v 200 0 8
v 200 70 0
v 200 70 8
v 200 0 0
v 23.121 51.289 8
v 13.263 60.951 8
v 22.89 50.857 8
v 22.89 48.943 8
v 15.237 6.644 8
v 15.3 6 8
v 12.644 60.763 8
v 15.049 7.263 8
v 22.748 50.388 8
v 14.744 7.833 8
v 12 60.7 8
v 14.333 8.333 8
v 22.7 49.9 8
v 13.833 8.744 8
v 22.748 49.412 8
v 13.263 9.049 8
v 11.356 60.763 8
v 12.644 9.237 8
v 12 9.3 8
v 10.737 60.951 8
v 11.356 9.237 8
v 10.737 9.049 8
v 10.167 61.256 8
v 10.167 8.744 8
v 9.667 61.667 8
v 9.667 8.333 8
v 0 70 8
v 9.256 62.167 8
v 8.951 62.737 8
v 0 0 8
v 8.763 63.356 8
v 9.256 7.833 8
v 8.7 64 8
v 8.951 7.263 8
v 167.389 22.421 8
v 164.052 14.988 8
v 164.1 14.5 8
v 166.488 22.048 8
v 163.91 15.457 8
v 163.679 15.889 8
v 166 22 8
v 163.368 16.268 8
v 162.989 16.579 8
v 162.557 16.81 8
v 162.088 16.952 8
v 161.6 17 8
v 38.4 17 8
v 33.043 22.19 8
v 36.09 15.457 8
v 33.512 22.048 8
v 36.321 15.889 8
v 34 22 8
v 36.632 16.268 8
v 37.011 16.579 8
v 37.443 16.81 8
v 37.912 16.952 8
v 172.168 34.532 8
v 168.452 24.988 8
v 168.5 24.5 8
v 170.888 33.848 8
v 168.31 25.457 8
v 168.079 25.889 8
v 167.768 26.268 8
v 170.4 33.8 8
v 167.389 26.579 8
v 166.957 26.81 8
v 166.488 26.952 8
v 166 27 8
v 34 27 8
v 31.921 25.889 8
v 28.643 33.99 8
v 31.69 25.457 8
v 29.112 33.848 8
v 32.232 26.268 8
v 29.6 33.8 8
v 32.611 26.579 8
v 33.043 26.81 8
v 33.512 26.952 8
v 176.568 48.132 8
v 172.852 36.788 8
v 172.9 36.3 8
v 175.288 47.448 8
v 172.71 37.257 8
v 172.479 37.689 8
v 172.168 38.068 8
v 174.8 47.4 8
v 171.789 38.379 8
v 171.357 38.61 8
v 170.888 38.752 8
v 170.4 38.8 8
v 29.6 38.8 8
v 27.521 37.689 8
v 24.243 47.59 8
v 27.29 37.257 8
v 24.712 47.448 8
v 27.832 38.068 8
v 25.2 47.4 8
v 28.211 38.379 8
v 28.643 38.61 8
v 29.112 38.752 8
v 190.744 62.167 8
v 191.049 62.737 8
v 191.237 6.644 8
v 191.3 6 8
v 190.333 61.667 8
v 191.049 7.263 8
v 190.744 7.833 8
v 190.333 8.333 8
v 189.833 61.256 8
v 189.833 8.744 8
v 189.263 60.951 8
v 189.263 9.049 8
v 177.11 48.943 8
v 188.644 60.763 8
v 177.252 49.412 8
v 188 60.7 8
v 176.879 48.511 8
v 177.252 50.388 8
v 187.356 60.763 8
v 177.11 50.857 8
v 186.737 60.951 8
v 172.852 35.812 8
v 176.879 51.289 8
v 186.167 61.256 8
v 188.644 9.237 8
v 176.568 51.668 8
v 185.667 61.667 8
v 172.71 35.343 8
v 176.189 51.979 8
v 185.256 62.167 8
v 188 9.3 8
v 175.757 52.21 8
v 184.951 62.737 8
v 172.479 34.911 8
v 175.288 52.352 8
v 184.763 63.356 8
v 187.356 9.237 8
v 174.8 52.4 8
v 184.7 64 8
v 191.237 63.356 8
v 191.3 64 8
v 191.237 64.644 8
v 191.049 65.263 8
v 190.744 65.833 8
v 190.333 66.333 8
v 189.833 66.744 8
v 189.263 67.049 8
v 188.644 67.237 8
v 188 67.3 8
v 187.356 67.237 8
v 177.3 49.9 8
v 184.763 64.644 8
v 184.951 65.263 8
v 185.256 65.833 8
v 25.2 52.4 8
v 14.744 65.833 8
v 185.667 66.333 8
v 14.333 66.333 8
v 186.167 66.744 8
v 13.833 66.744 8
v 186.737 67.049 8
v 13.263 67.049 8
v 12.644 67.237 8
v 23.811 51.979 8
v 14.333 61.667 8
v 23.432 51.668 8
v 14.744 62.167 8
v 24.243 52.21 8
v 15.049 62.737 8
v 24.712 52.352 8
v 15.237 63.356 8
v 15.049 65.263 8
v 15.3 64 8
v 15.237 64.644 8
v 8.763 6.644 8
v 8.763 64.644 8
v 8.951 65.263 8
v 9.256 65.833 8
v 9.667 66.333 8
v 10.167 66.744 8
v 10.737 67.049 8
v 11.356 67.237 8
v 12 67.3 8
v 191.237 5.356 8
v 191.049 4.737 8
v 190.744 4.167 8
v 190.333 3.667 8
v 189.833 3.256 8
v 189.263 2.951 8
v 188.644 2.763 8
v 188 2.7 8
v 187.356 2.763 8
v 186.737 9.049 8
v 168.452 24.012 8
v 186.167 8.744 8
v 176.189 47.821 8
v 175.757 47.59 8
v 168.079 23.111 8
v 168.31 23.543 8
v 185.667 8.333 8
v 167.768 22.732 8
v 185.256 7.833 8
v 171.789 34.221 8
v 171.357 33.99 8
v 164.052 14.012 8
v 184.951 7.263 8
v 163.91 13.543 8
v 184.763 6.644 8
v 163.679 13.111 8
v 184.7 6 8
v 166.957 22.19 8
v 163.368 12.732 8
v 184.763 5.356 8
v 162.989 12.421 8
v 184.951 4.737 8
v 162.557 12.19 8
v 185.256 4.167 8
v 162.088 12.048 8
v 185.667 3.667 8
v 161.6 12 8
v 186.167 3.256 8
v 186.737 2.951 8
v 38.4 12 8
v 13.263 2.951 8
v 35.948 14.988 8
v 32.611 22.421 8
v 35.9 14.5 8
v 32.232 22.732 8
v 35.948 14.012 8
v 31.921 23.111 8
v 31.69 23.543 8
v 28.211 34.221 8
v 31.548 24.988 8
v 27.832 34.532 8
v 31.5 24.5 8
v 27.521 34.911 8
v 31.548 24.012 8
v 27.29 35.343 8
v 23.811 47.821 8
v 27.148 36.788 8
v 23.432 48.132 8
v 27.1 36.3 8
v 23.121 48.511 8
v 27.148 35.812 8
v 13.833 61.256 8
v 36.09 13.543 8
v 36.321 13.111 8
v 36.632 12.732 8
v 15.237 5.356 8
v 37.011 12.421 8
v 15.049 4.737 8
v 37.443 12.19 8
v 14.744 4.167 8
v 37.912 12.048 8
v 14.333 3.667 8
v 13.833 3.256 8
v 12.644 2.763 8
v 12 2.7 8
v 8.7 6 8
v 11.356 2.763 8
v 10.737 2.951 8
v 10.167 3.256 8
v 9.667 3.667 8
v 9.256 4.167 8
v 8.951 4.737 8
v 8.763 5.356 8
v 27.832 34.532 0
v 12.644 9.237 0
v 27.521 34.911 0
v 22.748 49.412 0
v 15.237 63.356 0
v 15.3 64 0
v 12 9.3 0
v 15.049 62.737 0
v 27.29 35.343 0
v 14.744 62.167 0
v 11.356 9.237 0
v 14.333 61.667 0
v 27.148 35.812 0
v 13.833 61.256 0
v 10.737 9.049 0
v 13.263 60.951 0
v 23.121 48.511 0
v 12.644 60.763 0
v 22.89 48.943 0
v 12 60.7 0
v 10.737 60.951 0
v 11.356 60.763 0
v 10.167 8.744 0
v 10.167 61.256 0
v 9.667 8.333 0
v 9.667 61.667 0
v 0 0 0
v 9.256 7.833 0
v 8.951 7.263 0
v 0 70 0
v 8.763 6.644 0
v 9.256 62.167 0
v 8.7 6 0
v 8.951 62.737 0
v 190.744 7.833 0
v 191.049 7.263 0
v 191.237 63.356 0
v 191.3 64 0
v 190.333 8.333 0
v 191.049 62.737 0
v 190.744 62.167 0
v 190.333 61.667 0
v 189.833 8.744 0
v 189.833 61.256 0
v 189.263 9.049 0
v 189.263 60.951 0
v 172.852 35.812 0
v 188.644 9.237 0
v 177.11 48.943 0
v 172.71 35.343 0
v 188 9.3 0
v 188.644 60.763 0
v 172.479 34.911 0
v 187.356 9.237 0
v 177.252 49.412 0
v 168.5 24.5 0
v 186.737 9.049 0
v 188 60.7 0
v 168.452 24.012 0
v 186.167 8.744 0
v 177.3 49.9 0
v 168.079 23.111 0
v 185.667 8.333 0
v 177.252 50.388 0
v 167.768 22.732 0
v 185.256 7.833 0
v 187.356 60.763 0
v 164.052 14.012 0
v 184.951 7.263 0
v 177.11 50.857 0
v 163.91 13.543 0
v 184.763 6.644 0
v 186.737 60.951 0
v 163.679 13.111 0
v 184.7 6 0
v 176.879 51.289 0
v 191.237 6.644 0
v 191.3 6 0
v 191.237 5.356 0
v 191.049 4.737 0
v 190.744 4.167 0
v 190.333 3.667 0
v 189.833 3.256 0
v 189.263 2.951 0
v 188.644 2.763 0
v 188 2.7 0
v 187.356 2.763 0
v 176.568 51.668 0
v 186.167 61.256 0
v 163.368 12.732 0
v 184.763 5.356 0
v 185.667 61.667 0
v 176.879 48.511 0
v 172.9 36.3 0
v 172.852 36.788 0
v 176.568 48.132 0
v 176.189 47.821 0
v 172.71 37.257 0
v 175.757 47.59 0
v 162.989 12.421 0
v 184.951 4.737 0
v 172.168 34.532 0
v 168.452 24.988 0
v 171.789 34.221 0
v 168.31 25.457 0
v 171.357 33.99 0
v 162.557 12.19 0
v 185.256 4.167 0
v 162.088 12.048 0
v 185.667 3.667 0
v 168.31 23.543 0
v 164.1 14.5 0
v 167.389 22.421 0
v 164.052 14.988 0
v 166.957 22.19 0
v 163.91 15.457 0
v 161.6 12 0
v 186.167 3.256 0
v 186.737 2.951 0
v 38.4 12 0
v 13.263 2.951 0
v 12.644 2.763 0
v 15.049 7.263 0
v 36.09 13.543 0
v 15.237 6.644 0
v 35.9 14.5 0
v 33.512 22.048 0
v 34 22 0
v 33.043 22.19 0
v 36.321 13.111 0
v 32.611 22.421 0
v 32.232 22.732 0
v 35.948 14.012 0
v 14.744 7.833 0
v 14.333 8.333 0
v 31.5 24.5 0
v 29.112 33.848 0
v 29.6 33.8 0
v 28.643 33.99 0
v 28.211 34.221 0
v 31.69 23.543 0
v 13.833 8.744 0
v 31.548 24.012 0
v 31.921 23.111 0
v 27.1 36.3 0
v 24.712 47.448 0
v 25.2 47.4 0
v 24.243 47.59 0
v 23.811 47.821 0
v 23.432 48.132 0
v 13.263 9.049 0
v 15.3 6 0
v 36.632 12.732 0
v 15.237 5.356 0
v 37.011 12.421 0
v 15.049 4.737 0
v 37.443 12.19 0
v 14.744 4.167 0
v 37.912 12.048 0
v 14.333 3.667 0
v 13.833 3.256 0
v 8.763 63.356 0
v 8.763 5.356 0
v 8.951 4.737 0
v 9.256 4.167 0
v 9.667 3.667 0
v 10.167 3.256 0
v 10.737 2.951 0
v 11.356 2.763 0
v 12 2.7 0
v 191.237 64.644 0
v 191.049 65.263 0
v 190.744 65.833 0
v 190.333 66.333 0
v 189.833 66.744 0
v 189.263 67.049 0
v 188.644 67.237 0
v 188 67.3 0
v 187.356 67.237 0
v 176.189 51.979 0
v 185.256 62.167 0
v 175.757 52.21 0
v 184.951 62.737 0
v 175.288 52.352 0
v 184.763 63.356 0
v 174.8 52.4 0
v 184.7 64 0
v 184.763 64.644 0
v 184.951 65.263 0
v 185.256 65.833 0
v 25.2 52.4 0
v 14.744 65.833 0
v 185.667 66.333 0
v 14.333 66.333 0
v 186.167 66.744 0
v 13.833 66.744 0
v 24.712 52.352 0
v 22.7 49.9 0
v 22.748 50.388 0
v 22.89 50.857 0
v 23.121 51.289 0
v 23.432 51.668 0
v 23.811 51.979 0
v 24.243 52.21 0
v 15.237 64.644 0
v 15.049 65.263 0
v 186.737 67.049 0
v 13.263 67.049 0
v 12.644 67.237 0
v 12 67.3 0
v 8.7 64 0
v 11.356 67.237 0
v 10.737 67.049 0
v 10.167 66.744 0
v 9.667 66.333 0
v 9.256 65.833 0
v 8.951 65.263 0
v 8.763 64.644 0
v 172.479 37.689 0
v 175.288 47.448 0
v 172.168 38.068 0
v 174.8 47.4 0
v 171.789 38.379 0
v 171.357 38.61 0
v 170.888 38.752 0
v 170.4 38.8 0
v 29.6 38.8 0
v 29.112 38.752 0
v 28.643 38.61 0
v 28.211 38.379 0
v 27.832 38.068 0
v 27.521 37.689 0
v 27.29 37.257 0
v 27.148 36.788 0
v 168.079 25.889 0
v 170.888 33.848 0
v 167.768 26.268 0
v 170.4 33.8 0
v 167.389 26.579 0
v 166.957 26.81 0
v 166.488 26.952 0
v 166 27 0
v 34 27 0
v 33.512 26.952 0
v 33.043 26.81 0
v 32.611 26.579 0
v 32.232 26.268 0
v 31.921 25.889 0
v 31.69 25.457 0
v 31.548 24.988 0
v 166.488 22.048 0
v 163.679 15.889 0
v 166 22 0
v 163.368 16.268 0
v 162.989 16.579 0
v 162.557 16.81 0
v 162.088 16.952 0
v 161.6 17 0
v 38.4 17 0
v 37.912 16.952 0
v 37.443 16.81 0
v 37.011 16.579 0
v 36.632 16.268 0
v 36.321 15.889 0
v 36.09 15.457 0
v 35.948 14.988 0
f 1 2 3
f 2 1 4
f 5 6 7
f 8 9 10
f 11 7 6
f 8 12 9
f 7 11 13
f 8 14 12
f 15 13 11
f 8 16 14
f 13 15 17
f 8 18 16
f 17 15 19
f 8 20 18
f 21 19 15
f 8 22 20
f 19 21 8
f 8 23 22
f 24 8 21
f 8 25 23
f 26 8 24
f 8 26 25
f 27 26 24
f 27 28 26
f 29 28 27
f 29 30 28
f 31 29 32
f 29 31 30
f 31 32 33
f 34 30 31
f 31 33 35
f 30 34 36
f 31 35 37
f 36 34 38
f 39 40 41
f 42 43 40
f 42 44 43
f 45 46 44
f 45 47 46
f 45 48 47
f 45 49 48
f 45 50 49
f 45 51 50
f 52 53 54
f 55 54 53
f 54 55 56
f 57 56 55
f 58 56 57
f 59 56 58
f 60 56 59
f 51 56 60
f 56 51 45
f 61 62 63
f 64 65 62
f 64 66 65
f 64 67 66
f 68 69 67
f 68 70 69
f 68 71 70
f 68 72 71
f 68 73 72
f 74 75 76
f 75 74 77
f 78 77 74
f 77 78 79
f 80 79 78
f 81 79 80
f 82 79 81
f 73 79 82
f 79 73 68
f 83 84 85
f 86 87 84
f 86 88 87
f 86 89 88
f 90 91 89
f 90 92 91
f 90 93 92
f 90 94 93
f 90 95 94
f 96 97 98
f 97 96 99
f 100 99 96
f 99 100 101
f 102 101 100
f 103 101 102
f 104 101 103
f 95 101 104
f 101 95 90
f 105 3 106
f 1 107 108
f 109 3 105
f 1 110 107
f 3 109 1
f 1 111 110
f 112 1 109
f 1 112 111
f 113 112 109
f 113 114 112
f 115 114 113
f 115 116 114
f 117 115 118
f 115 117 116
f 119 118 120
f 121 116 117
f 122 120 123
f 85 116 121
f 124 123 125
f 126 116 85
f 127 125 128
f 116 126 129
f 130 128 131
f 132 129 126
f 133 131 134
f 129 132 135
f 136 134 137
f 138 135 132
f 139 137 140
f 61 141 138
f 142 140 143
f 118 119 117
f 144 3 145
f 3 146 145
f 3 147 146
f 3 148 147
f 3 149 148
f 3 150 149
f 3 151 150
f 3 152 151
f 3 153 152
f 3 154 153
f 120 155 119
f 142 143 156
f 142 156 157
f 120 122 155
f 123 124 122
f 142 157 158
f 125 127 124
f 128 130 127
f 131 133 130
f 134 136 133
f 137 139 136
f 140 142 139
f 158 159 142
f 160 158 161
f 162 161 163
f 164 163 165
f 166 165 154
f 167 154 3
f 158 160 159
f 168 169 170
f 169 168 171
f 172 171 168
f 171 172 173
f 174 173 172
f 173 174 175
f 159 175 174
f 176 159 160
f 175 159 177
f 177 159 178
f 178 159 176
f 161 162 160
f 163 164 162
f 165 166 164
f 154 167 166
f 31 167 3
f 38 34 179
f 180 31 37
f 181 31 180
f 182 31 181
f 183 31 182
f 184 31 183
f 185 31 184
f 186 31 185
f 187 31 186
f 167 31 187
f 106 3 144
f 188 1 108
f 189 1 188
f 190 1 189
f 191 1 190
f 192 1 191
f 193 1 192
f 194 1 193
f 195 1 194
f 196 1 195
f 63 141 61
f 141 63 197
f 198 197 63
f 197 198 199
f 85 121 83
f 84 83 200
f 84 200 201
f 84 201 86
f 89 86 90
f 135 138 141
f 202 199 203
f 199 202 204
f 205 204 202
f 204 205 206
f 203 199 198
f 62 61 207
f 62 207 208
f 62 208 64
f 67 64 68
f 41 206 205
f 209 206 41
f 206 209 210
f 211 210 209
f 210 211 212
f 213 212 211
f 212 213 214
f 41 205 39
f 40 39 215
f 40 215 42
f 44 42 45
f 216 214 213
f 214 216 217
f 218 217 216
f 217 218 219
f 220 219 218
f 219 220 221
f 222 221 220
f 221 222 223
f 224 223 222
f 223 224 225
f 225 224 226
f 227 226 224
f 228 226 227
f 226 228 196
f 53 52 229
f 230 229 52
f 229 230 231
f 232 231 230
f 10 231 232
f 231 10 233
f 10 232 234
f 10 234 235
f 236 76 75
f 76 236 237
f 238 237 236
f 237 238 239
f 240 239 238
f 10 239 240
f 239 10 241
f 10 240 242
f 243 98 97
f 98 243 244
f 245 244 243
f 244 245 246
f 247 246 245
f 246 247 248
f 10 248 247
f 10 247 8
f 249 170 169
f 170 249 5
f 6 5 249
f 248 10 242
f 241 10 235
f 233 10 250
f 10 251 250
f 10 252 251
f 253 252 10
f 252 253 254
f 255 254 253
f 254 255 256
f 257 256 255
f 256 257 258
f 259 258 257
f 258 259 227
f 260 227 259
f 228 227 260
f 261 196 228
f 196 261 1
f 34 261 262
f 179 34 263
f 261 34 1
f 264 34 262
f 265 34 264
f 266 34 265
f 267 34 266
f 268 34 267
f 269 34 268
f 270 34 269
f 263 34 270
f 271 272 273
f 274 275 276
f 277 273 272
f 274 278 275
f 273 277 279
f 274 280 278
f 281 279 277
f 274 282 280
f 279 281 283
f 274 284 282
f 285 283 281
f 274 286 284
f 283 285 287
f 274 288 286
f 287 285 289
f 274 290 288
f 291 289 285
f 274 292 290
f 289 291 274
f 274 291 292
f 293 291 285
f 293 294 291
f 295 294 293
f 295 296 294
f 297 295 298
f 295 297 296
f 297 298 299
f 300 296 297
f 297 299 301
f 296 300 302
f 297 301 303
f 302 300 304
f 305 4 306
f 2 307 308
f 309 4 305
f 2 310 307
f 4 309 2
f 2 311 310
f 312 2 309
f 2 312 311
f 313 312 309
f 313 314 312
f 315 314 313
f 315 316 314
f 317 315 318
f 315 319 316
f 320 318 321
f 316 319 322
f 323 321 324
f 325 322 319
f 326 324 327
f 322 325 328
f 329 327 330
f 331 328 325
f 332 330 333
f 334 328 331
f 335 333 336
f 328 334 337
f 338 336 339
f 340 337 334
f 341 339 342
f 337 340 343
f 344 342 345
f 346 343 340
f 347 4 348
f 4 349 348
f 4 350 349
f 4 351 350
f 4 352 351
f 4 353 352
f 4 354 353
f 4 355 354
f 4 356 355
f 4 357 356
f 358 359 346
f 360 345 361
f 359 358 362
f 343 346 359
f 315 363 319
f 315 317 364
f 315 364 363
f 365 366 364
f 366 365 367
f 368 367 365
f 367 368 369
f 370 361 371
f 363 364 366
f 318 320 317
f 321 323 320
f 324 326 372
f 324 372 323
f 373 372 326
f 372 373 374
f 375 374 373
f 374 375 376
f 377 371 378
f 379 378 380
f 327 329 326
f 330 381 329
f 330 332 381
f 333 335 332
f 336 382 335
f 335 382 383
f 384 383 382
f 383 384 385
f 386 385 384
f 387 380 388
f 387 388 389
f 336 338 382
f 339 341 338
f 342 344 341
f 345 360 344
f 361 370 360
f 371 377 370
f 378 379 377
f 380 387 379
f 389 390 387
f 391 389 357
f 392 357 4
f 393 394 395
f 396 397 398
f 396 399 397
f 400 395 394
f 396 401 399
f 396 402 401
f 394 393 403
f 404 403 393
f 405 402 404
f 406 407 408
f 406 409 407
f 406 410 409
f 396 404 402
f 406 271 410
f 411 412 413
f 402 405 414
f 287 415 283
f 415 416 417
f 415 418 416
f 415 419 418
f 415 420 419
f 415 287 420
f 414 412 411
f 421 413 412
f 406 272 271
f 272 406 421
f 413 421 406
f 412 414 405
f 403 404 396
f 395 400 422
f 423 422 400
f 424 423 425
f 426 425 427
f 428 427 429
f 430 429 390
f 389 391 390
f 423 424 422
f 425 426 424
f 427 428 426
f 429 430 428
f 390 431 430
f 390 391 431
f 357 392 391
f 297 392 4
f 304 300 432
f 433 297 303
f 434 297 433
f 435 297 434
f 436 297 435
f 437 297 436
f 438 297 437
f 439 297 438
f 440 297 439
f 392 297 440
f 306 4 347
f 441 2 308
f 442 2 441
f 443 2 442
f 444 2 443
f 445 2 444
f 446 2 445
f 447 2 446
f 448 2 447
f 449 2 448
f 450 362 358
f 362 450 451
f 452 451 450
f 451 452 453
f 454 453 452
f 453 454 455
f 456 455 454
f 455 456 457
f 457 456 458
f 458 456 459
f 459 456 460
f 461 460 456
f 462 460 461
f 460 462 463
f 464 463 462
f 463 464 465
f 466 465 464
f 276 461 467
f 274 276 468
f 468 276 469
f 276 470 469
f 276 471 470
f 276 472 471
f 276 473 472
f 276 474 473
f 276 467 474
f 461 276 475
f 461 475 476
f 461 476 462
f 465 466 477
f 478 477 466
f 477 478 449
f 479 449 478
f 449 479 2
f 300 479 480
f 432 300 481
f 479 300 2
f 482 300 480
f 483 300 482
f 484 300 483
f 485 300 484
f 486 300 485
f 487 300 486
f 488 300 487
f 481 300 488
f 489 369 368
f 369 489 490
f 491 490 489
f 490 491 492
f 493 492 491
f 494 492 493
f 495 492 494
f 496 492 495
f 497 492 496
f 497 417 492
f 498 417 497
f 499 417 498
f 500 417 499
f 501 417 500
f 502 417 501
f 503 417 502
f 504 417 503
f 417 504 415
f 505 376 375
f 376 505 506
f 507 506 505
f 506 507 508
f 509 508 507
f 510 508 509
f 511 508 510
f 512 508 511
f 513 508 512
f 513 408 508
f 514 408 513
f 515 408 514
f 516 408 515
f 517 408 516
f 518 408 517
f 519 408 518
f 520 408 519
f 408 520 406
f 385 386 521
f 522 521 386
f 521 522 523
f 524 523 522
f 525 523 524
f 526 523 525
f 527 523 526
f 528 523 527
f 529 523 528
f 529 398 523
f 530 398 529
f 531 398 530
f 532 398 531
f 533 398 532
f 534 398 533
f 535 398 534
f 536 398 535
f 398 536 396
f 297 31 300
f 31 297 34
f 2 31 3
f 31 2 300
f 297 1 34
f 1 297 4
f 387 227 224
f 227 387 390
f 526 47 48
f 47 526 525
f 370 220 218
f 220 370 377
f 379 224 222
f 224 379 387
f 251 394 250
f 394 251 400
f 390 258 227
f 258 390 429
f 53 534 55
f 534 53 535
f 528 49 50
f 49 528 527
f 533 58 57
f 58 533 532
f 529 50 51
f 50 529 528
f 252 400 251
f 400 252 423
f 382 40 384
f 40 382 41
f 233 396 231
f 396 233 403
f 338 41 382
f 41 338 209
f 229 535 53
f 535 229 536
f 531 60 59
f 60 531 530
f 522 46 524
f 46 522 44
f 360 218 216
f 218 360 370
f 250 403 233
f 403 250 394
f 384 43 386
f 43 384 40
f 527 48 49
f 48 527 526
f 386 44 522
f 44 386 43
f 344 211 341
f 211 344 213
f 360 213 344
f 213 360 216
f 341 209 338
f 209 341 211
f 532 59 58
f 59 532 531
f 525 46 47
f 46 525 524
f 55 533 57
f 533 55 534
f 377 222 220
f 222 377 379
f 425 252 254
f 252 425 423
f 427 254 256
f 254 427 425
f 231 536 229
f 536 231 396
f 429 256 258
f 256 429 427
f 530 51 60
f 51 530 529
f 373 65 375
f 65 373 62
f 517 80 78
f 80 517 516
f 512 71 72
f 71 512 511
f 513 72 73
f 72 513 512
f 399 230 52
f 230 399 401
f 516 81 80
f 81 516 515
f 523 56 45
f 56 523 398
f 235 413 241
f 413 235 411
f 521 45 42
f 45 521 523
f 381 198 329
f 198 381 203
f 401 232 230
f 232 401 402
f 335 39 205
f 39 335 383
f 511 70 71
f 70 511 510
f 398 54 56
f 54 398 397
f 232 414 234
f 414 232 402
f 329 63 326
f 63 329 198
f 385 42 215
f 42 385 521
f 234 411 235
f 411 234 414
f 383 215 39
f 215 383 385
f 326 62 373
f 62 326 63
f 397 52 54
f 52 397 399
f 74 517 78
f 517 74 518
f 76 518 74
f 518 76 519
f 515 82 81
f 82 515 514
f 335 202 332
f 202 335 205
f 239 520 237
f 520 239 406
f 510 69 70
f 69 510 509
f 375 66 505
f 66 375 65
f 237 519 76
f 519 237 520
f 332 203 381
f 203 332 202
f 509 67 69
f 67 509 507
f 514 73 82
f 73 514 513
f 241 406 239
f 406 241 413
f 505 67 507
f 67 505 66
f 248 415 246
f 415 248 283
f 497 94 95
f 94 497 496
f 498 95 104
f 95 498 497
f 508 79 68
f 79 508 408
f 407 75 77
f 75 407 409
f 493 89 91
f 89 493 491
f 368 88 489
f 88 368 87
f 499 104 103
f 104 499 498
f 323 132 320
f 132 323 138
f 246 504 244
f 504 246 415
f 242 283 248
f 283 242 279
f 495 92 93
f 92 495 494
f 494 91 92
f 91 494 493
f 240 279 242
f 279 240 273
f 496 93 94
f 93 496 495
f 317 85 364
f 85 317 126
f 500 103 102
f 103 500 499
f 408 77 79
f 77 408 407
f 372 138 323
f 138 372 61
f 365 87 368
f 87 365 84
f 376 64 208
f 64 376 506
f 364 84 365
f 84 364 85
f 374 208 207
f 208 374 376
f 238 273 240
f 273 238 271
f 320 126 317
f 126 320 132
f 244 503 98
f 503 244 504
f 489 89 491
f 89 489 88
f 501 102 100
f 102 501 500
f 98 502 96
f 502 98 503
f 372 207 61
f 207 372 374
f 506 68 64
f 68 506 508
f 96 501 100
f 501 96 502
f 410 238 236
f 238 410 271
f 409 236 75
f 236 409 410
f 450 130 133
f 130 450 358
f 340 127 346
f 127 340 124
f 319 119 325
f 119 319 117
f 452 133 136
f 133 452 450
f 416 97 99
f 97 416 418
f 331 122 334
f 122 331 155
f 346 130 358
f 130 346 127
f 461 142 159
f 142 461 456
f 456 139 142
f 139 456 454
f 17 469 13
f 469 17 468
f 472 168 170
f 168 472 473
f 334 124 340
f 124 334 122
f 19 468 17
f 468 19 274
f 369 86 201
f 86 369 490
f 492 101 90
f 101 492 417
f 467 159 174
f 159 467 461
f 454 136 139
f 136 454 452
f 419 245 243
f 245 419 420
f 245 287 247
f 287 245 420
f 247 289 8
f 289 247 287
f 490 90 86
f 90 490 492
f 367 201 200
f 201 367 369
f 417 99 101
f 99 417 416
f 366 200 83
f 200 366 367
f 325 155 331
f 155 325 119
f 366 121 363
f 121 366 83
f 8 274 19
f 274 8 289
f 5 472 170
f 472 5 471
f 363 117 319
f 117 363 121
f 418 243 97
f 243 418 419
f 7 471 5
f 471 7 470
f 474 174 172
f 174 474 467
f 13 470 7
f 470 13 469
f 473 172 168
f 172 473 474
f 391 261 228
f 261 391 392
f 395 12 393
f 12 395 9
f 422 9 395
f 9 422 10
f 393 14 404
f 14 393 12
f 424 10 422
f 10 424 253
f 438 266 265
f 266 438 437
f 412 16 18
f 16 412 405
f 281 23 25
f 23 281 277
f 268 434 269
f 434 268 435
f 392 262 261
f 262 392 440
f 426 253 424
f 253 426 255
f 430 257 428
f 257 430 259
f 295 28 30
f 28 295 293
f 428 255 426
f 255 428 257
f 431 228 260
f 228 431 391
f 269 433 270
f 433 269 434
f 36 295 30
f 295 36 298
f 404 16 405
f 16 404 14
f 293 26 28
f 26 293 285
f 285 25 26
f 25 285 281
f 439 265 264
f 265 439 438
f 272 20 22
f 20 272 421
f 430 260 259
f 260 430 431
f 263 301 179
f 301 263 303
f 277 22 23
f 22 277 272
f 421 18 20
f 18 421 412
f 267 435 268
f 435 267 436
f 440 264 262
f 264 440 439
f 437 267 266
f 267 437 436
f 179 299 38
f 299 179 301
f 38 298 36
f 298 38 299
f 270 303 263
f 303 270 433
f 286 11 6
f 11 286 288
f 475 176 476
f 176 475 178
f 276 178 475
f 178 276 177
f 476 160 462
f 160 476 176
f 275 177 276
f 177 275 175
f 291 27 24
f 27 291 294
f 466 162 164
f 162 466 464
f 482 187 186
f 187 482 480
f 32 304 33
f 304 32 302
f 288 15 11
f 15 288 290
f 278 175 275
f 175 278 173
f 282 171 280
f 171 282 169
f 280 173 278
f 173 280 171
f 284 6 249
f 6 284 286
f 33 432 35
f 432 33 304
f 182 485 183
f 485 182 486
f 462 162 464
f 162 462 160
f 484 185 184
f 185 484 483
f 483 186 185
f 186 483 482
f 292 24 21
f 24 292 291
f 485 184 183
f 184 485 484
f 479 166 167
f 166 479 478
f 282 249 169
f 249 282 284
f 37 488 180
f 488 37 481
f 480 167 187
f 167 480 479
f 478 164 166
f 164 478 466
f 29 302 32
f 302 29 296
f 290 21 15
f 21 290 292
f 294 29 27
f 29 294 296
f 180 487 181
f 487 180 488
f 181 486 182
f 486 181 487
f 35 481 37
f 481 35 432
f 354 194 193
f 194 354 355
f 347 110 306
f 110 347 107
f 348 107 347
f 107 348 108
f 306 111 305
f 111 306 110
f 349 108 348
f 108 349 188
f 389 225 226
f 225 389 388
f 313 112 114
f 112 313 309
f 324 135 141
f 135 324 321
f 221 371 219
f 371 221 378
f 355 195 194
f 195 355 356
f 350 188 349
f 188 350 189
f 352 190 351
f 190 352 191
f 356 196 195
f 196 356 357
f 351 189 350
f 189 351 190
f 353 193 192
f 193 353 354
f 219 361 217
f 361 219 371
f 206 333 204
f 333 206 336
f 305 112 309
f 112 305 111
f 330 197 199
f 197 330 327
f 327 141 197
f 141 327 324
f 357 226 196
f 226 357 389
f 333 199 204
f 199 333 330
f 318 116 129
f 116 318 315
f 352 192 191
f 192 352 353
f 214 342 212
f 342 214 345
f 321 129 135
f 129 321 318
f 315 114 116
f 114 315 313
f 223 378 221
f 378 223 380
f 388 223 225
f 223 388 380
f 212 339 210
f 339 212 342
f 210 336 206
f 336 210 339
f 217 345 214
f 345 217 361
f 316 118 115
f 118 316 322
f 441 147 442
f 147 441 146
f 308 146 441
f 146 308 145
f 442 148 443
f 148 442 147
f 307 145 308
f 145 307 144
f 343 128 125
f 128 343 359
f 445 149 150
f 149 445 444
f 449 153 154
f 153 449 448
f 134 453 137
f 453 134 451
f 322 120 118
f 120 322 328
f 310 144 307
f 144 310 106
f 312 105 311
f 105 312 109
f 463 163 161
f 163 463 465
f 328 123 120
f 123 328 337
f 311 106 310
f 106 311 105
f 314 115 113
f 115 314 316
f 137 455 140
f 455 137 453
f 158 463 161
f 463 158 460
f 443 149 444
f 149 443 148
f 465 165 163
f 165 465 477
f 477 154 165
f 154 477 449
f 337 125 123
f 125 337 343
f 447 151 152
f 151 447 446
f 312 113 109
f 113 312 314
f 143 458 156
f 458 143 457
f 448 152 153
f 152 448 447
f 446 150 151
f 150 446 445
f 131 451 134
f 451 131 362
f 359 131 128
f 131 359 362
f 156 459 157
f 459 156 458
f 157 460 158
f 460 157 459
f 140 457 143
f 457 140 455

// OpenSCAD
$fn = 32;

// ----------------------------------------------------------------------
// Slotted panel: 200 x 70 mm, 4 ряда of slots
// ----------------------------------------------------------------------

// --- parameters (mm) ---
panel_w = 200;            // panel width
panel_d = 70;             // panel depth
thick = 8;                // panel thickness
slot_w = 5;               // slot width
pitch0 = 10;              // first row pitch
pitch_step = 1.8;         // pitch increase per row
margin = 12;              // margin around the slot field
rows = 4;                 // number of slot rows
mount_d = 6.6;            // mounting holes
mount_x = 88;             // mounting hole offset

difference() {
  union() {
    cube([panel_w, panel_d, thick]);
  }
  /* slot rows: stadium shaped cutters, 2.5 mm clear of both faces */
  /* row 0: pitch 10, length 123.2 */
  hull() {
    translate([38.4, 14.5, -2.5]) cylinder(h = thick + 5, d = slot_w);
    translate([161.6, 14.5, -2.5]) cylinder(h = thick + 5, d = slot_w);
  }
  /* row 1: pitch 11.8, length 132 */
  hull() {
    translate([34, 24.5, -2.5]) cylinder(h = thick + 5, d = slot_w);
    translate([166, 24.5, -2.5]) cylinder(h = thick + 5, d = slot_w);
  }
  /* row 2: pitch 13.6, length 140.8 */
  hull() {
    translate([29.6, 36.3, -2.5]) cylinder(h = thick + 5, d = slot_w);
    translate([170.4, 36.3, -2.5]) cylinder(h = thick + 5, d = slot_w);
  }
  /* row 3: pitch 15.4, length 149.6 */
  hull() {
    translate([25.2, 49.9, -2.5]) cylinder(h = thick + 5, d = slot_w);
    translate([174.8, 49.9, -2.5]) cylinder(h = thick + 5, d = slot_w);
  }
  translate([12, 6, -2.5]) cylinder(h = 13, d = mount_d);
  translate([12, 64, -2.5]) cylinder(h = 13, d = mount_d);
  translate([188, 6, -2.5]) cylinder(h = 13, d = mount_d);
  translate([188, 64, -2.5]) cylinder(h = 13, d = mount_d);
}
